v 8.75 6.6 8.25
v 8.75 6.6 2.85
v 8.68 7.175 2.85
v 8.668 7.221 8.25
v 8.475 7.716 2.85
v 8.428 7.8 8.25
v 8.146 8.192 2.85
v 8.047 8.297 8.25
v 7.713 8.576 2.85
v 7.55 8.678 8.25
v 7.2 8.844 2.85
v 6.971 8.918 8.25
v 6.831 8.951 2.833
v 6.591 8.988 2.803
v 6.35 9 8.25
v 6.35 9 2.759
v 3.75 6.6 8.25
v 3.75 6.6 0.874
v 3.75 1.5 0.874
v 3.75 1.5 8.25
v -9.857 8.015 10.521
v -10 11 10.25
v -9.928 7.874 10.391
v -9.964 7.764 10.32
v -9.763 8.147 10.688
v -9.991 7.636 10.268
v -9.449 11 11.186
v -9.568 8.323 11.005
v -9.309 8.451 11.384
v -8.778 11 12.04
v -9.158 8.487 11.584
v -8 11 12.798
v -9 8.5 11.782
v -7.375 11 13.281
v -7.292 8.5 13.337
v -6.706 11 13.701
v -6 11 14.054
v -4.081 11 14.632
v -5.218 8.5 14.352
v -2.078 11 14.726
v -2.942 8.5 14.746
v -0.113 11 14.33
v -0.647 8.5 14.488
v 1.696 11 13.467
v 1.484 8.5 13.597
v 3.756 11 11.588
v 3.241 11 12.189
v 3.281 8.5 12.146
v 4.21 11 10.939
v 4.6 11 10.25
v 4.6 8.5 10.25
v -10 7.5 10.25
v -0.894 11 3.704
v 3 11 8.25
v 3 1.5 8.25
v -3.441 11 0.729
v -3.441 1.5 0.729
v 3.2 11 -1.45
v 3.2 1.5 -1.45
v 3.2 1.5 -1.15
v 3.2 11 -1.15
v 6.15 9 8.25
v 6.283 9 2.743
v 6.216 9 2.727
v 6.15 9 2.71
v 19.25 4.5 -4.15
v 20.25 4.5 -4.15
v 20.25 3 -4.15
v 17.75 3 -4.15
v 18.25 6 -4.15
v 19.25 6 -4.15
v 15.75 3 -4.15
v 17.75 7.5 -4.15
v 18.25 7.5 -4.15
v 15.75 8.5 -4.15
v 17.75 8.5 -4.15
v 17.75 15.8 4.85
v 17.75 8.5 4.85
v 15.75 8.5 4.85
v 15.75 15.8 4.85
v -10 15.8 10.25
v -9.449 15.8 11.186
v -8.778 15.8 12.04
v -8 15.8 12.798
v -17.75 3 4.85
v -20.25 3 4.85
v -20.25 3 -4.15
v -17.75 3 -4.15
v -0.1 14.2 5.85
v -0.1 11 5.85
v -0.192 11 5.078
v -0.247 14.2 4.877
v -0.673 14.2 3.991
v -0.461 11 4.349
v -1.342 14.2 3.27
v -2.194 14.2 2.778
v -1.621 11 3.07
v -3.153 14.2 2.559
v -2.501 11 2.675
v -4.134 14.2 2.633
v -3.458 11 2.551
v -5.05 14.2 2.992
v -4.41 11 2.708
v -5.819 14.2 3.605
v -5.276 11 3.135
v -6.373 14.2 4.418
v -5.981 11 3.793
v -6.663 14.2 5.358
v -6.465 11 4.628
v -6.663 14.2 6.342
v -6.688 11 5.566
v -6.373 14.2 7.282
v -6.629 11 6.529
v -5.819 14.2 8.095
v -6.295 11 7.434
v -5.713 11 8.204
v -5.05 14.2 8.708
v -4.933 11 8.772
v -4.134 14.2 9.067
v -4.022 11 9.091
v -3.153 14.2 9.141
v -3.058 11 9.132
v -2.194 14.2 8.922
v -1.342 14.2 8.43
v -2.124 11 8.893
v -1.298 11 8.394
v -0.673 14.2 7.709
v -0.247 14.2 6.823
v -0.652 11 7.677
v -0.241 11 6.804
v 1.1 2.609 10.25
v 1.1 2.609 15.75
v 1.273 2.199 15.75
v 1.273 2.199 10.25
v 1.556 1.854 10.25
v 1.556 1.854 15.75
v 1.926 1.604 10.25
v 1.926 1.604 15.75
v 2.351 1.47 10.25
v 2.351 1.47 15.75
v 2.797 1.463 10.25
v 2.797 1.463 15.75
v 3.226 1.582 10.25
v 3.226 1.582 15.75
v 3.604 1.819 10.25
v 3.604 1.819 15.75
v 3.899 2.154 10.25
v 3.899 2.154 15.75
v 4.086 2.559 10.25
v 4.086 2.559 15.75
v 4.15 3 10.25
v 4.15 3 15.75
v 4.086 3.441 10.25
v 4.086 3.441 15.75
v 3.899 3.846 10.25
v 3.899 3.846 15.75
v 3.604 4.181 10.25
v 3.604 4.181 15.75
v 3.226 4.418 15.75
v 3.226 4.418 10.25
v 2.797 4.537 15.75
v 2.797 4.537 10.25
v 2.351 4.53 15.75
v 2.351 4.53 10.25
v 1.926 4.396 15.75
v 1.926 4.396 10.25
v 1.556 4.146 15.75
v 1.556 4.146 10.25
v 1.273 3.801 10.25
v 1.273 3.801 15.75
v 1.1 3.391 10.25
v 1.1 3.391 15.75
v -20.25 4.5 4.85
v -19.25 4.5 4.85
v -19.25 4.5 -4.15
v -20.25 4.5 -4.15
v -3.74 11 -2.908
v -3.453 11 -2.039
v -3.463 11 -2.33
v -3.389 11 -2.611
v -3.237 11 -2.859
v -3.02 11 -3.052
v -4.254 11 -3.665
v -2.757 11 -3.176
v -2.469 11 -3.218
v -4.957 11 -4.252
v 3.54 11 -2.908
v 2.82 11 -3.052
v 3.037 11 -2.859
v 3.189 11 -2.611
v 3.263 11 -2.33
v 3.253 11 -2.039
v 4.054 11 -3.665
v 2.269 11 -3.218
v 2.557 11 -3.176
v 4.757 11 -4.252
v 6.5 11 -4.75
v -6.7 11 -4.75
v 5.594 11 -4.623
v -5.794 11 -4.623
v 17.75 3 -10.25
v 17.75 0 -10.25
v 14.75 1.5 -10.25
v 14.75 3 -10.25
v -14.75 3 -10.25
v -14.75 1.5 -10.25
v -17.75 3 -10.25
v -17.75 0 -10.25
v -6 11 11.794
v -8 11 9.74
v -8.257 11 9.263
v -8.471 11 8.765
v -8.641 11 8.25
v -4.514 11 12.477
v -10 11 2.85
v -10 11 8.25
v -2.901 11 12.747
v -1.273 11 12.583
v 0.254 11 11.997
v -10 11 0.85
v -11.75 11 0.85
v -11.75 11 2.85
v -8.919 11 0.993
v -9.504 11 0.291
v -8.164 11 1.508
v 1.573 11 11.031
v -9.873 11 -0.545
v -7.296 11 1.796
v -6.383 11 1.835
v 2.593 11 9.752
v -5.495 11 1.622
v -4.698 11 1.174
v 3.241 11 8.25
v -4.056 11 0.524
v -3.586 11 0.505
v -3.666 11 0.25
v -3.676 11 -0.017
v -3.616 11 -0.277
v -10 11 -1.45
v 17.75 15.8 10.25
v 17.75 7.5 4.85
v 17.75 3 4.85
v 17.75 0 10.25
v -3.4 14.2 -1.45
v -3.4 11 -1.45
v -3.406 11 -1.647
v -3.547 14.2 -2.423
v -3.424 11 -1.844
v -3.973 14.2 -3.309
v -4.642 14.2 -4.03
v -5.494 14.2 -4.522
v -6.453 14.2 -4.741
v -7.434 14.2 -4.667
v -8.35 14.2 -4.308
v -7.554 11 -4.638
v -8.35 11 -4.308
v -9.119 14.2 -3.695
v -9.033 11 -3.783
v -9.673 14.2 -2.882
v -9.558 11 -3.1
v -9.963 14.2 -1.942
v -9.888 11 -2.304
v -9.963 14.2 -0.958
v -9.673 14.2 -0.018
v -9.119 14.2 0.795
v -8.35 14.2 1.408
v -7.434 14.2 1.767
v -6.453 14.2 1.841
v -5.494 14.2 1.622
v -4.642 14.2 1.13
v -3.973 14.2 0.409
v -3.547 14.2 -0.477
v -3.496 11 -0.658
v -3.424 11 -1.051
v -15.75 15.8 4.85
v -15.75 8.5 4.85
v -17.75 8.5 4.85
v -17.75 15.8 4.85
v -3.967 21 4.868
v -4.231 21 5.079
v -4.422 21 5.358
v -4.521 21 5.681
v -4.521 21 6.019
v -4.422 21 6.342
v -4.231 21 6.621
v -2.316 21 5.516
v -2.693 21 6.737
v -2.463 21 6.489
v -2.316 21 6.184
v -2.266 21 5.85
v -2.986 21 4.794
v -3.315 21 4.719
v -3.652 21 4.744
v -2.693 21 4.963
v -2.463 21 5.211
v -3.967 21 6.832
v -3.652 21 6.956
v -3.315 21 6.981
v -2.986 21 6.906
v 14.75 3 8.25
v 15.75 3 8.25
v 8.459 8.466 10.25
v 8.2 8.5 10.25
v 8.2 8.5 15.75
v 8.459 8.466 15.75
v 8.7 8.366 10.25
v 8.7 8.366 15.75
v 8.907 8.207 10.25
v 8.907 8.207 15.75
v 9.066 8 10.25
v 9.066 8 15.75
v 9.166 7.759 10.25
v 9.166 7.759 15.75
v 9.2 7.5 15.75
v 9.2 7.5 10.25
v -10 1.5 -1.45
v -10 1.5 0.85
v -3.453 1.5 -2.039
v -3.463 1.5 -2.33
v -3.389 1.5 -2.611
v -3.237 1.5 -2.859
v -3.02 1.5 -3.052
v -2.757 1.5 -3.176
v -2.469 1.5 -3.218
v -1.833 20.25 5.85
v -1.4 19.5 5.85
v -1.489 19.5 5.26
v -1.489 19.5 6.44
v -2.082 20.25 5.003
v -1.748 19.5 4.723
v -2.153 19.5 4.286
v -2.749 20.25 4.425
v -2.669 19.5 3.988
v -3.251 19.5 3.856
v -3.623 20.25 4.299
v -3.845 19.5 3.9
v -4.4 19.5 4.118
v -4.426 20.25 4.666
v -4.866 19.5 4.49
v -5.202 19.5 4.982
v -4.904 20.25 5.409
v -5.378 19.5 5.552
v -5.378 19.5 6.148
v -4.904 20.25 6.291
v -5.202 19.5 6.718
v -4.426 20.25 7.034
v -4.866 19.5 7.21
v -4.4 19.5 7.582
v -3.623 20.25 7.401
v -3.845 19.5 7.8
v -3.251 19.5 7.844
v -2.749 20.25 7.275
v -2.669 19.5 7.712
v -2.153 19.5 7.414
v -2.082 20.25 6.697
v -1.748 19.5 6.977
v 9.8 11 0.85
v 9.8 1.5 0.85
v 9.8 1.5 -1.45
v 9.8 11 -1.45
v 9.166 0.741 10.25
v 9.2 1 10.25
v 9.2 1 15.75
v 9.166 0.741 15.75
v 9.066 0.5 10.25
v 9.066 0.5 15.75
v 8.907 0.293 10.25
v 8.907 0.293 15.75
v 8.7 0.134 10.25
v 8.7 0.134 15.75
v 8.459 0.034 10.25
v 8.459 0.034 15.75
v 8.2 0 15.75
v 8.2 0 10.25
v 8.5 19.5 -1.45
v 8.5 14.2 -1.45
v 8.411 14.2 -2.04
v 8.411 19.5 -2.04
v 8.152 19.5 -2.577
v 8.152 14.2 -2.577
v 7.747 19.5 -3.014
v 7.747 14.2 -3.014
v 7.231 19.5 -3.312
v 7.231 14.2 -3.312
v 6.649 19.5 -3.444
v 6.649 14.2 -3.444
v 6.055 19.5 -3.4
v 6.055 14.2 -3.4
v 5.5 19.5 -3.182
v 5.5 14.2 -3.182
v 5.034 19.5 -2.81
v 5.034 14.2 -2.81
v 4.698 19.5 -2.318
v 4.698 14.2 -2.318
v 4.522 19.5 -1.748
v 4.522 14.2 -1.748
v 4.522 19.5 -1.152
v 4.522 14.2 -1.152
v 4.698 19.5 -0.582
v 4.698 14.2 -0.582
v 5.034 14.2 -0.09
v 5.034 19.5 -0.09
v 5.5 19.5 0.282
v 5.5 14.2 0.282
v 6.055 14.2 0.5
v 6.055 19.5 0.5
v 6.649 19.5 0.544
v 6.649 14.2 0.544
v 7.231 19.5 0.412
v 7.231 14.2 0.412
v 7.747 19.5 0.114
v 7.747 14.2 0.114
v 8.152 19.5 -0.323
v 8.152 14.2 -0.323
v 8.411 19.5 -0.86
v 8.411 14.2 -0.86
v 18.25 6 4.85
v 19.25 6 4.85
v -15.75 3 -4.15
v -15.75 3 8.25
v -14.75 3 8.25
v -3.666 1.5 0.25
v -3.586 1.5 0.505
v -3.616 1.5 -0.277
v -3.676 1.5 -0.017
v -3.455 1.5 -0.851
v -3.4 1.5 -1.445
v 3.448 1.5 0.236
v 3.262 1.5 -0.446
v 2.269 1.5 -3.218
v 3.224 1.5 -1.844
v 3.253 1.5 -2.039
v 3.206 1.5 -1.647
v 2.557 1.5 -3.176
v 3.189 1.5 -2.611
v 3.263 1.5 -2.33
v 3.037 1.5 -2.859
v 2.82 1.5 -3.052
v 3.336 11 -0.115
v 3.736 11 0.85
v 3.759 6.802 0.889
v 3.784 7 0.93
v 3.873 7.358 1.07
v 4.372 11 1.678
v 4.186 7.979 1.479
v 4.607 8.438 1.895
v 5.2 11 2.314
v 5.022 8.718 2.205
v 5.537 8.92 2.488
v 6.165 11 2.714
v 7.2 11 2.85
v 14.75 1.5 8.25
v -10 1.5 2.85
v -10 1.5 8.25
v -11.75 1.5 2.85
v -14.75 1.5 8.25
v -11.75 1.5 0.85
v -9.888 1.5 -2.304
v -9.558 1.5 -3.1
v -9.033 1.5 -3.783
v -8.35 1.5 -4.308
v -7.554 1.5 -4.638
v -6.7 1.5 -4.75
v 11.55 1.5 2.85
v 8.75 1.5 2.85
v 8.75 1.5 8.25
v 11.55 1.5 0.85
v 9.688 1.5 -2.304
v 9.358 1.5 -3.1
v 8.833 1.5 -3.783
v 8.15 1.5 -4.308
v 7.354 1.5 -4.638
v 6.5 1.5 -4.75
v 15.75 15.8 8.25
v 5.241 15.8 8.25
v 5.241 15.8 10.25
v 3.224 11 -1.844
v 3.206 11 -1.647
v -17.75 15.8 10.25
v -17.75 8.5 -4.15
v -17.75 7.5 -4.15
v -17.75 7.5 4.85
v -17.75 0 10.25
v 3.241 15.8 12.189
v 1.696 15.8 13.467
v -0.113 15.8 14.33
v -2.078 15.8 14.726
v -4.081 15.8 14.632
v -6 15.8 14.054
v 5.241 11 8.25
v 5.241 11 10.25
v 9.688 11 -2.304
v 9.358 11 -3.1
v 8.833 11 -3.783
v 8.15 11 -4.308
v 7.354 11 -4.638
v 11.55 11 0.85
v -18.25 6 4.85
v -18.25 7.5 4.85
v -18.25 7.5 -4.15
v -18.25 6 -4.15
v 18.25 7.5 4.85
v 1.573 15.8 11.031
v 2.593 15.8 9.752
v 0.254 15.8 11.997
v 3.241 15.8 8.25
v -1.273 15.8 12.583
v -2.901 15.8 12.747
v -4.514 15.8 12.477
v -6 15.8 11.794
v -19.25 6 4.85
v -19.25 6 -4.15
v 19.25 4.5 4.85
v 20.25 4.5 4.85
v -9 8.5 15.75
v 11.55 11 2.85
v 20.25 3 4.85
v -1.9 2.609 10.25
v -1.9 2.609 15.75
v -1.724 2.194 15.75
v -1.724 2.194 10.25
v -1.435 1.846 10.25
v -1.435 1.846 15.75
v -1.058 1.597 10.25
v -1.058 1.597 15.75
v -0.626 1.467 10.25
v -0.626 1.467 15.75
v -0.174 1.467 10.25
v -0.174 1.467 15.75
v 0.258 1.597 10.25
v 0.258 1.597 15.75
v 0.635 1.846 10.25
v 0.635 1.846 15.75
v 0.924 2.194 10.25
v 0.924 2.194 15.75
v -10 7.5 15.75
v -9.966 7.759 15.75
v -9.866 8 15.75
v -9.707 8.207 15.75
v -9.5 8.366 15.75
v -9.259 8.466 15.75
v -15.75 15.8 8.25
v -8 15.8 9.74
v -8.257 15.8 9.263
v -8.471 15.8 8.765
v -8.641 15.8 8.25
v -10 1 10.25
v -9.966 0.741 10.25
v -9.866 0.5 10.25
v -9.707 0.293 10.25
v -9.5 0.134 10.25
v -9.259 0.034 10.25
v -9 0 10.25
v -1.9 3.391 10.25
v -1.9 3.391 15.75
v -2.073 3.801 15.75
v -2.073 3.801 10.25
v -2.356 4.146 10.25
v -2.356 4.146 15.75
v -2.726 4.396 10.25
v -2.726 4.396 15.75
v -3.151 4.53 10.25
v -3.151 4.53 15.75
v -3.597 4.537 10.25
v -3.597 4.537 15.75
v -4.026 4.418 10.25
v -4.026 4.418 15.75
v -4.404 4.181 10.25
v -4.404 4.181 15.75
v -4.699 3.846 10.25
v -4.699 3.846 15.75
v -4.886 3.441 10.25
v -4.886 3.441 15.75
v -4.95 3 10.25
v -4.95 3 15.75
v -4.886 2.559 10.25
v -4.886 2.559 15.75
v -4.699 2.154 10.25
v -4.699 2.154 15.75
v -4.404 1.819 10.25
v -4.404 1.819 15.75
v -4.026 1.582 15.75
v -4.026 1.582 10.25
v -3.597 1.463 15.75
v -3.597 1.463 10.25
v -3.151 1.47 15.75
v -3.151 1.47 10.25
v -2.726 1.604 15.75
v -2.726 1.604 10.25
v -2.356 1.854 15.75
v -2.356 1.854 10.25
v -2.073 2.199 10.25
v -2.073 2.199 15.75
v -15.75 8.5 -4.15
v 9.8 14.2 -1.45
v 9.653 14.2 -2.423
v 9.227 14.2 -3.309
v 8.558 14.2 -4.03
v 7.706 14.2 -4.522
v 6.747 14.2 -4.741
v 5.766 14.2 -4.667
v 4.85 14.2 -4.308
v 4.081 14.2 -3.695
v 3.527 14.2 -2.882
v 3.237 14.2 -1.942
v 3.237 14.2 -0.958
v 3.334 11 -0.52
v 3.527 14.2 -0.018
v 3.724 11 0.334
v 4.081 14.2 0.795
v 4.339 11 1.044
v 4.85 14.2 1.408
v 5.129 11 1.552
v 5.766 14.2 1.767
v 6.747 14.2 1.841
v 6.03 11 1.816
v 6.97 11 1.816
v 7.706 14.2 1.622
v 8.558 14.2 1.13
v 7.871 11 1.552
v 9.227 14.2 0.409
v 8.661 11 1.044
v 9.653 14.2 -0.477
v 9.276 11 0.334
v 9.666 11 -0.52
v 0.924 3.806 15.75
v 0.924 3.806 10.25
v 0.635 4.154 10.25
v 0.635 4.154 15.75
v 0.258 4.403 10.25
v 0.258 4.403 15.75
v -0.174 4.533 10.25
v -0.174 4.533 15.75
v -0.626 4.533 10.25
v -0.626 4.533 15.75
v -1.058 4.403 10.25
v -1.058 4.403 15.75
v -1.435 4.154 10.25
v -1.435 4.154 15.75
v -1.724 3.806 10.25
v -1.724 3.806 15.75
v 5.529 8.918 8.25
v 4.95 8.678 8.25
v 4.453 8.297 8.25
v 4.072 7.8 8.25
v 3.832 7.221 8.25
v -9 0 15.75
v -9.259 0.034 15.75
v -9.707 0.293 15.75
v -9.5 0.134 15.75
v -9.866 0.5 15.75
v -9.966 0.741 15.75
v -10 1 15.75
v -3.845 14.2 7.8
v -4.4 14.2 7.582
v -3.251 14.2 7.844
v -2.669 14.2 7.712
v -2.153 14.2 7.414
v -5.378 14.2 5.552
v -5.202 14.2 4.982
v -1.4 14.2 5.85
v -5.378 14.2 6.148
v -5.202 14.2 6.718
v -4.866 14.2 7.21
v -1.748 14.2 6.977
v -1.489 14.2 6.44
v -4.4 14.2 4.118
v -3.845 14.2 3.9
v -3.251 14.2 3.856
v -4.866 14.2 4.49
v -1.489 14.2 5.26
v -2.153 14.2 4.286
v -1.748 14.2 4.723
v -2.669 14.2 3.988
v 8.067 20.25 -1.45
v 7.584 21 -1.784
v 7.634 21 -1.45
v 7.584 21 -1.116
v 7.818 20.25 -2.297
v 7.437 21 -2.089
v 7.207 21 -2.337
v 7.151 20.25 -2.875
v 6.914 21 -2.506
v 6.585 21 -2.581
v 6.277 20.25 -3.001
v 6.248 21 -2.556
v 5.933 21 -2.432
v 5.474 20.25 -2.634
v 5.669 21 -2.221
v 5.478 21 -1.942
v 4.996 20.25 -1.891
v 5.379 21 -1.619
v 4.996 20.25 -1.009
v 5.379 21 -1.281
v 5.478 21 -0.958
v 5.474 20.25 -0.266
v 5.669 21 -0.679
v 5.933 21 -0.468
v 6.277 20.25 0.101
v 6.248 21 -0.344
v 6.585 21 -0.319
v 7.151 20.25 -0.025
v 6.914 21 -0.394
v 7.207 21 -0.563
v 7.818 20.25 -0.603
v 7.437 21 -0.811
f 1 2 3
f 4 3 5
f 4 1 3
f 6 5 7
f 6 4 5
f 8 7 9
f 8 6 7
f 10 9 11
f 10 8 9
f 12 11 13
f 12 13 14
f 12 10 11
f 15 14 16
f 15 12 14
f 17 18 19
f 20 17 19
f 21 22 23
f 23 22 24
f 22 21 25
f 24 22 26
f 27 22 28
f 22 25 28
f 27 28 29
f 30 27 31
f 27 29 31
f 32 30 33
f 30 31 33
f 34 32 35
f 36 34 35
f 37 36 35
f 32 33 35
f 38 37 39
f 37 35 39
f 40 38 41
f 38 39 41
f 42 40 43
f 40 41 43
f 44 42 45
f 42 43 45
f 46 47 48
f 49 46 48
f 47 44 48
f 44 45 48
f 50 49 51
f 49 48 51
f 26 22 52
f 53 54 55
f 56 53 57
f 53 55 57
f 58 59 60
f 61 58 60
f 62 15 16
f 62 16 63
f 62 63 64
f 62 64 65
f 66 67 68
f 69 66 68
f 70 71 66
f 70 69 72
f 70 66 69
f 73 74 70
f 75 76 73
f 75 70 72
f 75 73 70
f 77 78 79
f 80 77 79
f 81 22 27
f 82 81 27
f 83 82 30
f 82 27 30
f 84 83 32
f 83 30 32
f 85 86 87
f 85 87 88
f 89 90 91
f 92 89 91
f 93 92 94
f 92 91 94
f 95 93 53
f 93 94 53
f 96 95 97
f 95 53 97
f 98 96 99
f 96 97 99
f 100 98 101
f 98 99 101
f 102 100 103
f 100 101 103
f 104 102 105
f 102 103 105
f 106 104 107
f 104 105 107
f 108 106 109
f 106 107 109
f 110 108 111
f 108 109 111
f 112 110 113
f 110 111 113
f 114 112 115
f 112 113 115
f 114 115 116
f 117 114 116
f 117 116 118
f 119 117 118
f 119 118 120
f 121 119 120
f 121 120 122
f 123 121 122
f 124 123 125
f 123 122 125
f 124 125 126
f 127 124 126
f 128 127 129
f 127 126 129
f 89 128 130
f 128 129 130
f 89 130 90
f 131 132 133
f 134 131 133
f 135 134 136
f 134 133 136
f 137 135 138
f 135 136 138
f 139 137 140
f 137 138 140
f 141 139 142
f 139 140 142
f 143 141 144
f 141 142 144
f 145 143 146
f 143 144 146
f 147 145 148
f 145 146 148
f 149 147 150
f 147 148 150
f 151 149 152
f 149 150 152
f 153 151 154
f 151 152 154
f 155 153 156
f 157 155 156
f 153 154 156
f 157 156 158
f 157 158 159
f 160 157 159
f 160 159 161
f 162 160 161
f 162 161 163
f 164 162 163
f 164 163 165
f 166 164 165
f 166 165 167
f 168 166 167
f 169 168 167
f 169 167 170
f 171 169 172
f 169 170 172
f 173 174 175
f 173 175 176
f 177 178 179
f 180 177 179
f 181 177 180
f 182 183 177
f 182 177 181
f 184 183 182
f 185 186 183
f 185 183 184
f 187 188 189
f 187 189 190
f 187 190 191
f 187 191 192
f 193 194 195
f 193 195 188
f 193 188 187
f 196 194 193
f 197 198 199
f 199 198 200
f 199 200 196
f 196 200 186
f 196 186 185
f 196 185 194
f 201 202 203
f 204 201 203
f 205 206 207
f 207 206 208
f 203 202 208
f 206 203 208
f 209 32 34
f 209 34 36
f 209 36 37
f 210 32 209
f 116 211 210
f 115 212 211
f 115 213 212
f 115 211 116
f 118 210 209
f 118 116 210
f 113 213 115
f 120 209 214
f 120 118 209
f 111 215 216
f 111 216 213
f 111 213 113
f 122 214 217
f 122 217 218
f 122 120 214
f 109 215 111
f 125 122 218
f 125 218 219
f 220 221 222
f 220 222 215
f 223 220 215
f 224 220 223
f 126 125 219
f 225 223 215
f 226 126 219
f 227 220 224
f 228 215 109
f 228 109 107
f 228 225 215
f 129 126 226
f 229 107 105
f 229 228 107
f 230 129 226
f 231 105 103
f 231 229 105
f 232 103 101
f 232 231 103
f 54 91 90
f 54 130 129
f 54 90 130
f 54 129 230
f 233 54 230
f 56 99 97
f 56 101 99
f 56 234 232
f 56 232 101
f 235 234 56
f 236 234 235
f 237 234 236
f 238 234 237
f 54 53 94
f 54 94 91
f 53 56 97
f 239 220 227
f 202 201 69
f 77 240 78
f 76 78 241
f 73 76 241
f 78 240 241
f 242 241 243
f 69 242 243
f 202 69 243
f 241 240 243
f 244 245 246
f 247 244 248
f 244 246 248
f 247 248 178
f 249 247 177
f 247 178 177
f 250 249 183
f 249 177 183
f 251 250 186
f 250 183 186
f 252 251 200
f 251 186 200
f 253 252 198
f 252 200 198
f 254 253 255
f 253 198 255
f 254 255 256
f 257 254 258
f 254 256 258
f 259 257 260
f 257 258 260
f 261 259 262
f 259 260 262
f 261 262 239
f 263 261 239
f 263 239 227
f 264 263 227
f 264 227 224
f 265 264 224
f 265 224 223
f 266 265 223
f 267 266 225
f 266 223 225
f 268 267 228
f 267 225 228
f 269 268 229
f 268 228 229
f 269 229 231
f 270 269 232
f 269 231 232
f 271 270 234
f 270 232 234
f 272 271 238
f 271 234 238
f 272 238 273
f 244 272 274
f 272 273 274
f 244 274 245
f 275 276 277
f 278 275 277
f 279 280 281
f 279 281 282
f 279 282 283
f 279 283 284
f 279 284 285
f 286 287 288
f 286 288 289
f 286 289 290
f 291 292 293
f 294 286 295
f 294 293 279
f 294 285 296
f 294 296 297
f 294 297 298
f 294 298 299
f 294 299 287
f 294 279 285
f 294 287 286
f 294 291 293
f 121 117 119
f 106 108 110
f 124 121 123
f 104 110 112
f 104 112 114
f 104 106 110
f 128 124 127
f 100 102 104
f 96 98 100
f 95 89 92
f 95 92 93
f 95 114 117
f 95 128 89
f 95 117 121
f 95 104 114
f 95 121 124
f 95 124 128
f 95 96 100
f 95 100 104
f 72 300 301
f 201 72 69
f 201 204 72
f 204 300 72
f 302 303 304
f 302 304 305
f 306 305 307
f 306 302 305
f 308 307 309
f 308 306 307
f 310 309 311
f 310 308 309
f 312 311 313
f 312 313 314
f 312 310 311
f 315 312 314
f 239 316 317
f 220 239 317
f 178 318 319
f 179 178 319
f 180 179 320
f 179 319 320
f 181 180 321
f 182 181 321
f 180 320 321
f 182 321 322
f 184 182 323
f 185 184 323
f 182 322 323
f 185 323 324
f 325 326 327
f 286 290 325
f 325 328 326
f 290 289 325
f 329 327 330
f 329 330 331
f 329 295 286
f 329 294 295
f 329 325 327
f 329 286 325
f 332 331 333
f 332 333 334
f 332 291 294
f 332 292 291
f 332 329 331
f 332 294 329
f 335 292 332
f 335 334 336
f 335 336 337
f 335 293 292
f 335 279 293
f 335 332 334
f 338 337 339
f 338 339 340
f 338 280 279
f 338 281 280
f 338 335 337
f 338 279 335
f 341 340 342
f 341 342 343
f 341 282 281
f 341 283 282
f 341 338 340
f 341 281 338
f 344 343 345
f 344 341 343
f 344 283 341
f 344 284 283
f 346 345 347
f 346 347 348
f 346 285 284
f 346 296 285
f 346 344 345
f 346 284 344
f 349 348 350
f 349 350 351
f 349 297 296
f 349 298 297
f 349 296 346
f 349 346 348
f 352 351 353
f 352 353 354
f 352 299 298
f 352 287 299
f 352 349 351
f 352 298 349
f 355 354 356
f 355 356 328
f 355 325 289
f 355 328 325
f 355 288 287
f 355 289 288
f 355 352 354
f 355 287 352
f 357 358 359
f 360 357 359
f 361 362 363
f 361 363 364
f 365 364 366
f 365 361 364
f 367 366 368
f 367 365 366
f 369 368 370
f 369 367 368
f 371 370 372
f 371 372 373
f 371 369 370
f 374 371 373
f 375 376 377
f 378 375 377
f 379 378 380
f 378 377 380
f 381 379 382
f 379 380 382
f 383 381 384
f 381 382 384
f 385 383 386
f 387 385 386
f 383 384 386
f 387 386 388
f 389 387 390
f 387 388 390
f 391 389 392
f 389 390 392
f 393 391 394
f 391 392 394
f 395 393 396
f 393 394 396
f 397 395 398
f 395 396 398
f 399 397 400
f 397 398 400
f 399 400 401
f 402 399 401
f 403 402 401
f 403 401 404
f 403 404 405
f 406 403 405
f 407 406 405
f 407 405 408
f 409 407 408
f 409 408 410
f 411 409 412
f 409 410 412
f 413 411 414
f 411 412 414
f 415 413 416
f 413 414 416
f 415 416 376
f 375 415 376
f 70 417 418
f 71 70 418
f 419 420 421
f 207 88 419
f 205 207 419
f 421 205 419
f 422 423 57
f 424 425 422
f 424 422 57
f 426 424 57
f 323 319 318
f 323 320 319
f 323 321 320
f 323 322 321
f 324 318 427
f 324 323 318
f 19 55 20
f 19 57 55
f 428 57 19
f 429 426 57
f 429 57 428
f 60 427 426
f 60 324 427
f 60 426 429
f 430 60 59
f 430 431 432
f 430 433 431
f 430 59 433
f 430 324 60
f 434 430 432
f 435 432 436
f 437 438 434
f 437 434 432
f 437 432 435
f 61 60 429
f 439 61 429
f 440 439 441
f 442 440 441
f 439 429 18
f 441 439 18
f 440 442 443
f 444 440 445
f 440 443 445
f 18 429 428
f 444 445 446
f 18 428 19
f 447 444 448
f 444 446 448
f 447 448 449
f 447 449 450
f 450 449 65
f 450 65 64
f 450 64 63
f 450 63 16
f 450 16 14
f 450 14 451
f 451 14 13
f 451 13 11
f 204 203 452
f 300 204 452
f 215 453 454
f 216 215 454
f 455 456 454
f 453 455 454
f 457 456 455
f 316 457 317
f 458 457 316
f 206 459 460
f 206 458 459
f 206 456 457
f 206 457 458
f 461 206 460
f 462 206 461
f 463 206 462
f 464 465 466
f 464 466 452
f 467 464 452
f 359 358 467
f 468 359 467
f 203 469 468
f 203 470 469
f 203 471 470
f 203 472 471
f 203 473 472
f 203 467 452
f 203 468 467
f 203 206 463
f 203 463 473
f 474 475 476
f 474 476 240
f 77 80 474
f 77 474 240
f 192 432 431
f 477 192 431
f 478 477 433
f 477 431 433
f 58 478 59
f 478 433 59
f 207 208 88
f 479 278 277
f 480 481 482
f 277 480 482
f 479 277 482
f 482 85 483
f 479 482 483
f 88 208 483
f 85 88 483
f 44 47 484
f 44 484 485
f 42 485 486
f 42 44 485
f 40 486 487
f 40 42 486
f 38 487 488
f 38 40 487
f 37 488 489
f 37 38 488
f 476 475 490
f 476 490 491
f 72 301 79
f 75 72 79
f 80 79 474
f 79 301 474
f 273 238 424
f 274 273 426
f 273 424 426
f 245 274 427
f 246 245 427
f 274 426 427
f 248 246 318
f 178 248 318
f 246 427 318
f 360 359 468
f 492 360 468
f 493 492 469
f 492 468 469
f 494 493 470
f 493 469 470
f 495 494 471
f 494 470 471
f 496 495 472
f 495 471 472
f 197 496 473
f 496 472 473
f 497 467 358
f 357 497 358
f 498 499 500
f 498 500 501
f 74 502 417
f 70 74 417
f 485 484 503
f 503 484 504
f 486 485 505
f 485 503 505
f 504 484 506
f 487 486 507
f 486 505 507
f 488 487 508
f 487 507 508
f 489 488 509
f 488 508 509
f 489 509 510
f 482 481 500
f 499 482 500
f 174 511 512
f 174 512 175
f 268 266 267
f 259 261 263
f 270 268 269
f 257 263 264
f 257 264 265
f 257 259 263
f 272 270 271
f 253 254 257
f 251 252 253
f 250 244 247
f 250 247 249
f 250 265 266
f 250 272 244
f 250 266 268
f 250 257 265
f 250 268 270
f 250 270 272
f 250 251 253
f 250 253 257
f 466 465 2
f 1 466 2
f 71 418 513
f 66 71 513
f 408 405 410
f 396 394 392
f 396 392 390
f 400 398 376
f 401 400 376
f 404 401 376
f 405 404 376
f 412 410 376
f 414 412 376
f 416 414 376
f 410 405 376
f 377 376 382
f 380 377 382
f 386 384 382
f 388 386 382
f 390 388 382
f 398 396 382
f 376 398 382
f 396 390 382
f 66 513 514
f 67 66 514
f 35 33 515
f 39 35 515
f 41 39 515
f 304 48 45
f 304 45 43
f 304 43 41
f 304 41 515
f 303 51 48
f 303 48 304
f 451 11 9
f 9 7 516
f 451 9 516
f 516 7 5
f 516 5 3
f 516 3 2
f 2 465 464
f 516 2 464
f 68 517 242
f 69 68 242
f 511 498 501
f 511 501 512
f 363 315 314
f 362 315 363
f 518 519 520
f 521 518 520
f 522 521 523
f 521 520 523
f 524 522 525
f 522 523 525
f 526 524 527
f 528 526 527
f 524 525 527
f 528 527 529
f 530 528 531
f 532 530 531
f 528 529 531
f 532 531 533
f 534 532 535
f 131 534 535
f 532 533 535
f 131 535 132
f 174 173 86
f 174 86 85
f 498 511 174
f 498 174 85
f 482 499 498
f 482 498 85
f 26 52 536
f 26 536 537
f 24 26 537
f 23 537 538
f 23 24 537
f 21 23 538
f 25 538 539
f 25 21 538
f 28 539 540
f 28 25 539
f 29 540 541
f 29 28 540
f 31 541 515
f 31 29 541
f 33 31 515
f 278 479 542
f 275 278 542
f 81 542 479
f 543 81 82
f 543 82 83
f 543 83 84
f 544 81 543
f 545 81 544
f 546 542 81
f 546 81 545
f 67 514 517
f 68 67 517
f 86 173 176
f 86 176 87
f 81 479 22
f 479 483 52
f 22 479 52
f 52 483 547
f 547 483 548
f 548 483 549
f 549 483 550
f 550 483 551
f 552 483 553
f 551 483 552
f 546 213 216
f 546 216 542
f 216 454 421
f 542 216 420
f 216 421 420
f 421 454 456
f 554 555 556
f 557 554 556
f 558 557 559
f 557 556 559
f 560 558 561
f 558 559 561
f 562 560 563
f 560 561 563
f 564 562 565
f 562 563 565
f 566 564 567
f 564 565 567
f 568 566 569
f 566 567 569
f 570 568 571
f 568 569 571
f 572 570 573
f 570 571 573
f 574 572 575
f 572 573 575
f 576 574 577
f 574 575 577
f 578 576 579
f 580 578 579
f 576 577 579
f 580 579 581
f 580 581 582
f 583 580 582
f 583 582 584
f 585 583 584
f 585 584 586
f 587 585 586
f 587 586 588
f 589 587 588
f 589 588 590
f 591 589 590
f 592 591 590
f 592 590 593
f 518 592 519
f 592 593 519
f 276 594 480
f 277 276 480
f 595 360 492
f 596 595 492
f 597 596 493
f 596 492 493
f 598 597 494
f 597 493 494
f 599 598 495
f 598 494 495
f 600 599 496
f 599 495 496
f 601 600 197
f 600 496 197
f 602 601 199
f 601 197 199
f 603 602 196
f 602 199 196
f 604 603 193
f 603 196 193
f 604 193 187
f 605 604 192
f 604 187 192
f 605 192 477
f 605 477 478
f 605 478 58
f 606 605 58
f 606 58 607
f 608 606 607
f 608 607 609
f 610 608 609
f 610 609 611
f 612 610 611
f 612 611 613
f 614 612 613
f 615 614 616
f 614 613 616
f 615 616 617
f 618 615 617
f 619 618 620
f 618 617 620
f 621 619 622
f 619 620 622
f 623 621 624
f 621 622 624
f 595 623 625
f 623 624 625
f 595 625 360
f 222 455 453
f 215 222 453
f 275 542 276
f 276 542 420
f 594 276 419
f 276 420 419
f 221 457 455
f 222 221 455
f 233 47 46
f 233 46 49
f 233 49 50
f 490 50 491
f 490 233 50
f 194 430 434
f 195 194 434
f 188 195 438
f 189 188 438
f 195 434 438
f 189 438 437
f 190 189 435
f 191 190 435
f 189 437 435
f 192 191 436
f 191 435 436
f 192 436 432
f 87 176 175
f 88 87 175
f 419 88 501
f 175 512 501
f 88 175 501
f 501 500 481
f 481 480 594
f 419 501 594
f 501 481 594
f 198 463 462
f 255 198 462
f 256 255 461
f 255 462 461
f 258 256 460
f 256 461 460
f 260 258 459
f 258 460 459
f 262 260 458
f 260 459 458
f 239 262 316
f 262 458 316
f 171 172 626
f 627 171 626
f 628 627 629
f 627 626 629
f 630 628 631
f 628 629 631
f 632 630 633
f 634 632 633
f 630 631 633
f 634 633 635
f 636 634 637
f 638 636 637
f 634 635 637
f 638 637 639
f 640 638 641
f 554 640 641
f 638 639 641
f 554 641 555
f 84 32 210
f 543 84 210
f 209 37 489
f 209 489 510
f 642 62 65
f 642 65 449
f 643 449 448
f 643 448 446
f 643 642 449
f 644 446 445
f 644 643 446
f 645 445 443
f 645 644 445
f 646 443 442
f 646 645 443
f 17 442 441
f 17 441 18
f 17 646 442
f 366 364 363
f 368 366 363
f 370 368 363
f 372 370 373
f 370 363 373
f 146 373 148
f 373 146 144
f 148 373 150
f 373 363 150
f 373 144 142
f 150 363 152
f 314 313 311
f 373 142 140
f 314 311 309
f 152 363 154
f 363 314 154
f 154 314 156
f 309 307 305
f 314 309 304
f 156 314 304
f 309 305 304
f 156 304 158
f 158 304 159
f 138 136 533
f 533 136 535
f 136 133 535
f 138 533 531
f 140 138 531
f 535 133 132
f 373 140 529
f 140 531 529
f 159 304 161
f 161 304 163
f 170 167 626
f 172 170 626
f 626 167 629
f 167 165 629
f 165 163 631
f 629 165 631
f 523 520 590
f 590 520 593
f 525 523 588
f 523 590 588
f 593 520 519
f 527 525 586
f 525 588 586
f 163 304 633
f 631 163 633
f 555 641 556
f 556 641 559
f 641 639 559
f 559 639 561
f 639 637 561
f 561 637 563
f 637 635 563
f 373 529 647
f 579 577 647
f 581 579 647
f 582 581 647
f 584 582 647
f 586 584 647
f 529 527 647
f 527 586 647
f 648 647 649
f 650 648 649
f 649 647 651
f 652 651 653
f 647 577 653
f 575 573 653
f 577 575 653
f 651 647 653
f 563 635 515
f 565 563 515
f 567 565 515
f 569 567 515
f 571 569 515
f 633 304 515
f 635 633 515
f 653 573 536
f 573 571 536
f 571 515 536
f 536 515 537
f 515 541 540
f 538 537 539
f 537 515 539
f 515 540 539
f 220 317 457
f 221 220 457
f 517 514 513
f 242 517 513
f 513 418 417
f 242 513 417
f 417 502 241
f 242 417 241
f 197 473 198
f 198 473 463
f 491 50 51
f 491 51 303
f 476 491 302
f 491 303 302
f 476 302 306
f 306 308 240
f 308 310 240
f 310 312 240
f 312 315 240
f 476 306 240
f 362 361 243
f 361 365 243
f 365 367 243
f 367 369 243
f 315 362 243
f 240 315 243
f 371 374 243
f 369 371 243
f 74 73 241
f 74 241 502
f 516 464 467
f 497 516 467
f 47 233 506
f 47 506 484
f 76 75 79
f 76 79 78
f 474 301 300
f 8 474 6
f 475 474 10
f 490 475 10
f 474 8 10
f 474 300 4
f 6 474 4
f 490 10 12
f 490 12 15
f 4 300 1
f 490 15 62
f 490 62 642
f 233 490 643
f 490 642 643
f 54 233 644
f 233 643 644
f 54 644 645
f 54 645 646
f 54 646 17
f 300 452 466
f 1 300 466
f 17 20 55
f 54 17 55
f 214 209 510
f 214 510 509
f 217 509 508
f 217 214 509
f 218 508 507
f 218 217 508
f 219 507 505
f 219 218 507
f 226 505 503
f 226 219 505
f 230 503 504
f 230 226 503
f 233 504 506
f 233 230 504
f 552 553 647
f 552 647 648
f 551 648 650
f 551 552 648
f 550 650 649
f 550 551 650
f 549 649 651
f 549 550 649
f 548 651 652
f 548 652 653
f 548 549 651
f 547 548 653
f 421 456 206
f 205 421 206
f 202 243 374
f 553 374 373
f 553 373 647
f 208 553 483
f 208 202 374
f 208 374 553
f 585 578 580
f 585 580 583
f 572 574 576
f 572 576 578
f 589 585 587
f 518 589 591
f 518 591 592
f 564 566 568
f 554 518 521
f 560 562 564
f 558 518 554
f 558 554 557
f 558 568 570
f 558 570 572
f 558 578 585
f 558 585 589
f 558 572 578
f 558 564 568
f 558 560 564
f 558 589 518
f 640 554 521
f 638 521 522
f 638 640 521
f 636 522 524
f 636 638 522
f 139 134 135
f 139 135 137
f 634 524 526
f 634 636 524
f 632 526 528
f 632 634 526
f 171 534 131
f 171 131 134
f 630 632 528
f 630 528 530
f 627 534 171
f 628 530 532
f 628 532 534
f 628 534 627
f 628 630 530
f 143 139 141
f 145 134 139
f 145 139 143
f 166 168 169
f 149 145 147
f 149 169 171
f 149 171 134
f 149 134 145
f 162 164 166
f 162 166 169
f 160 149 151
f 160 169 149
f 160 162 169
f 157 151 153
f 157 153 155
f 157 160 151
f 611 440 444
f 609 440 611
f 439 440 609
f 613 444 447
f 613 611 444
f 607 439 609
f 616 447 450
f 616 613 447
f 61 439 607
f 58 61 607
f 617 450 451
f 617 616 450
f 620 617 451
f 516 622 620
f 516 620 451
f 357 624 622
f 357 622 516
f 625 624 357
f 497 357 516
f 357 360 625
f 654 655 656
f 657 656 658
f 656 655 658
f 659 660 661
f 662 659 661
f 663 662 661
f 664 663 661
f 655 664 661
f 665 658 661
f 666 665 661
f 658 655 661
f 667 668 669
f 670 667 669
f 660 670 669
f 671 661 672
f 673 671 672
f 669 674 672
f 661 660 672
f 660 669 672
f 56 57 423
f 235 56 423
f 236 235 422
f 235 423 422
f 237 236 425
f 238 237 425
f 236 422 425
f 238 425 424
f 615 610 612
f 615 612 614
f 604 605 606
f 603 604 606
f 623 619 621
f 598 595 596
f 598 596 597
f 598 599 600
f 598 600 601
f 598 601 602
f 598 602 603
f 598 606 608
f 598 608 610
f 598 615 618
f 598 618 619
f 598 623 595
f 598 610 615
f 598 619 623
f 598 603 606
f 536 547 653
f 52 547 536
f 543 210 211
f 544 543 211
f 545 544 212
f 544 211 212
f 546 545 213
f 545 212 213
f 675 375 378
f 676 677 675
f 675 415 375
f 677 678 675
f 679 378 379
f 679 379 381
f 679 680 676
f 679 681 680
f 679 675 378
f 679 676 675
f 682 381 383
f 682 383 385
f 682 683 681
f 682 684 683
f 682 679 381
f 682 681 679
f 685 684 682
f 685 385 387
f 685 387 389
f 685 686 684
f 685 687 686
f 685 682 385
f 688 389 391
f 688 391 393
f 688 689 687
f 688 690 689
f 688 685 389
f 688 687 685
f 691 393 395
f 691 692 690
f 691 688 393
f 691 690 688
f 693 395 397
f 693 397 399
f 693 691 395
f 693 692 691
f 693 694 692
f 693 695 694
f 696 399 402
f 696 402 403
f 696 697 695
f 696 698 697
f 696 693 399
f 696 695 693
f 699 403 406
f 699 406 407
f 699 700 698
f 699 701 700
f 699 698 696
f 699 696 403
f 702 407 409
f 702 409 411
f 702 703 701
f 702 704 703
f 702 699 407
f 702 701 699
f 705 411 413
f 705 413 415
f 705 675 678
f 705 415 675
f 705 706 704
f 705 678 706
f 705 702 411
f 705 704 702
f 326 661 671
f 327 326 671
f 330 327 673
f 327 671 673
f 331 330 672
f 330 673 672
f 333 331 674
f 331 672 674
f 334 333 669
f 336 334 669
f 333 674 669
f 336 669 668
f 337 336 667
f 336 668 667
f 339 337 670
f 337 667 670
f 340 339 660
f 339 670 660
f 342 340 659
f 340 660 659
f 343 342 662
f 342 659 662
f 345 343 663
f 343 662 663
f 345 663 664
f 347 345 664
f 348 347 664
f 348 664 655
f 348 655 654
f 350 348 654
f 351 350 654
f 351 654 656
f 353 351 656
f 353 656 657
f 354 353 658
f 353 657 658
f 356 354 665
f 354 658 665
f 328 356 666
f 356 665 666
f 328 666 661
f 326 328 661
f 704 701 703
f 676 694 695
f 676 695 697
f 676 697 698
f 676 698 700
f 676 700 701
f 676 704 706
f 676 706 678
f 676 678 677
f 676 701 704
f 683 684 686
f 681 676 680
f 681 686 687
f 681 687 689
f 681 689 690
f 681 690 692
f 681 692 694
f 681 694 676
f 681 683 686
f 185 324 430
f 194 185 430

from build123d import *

# Parameters (mm, degrees)
SKETCH1_W             = 35.5
SKETCH1_H             = 20.5
BOSS_EXTRUDE1_DEPTH   = 1.5
BOSS_EXTRUDE2_DEPTH   = 1.5
BOSS_EXTRUDE4_DEPTH   = 9.5
SKETCH6_R             = 3.3
BOSS_EXTRUDE5_DEPTH   = 3.2
SKETCH7_R             = 2
BOSS_EXTRUDE6_DEPTH   = 6.8
BOSS_EXTRUDE6_2_DEPTH = 6.8
CHAMFER1_SIZE         = 1.5
CHAMFER1_SIZE2        = 0.866025404
CHAMFER2_SIZE         = 1.5
CHAMFER2_SIZE2        = 0.866025404
BOSS_EXTRUDE7_DEPTH   = 8
BOSS_EXTRUDE8_DEPTH   = 4.8
BOSS_EXTRUDE9_DEPTH   = 5.5
BOSS_EXTRUDE10_DEPTH  = 9
BOSS_EXTRUDE11_DEPTH  = 9
CUT_EXTRUDE4_DEPTH    = 5.5


with BuildPart() as part:
    # Sketch1 → Boss-Extrude1 (new body)
    with BuildSketch(Plane(origin=(0, 0, 0), x_dir=(1, 0, 0), z_dir=(0, 1, 0))):
        Rectangle(SKETCH1_W, SKETCH1_H)
    extrude(amount=BOSS_EXTRUDE1_DEPTH)

    # Sketch2 → Boss-Extrude2 (add)
    with BuildSketch(Plane(origin=(0, 1.5, 0), x_dir=(1, 0, 0), z_dir=(0, 1, 0))):
        Polygon((17.75, 10.25), (14.75, 10.25), (14.75, -8.25), (-14.75, -8.25), (-14.75, 10.25), (-17.75, 10.25), (-17.75, -10.25), (17.75, -10.25), align=None)
    extrude(amount=BOSS_EXTRUDE2_DEPTH)

    # Sketch4 → Boss-Extrude4 (add)
    with BuildSketch(Plane(origin=(0, 1.5, 0), x_dir=(1, 0, 0), z_dir=(0, 1, 0))):
        with BuildLine():
            ThreePointArc((9.8, 1.45), (8.833452378, 3.783452378), (6.5, 4.75))
            Line((6.5, 4.75), (-6.7, 4.75))
            ThreePointArc((-6.7, 4.75), (-9.033452378, 3.783452378), (-10, 1.45))
            Line((-10, 1.45), (-10, -0.85))
            Line((-10, -0.85), (-11.75, -0.85))
            Line((-11.75, -0.85), (-11.75, -2.85))
            Line((-11.75, -2.85), (-10, -2.85))
            Line((-10, -2.85), (-10, -8.25))
            Line((-10, -8.25), (3, -8.25))
            Line((3, -8.25), (-3.440516213, -0.729311618))
            ThreePointArc((-3.440516213, -0.729311618), (-3.666156861, -0.250346383), (-3.615628786, 0.276690914))
            ThreePointArc((-3.615628786, 0.276690914), (-3.413949819, 1.146892415), (-3.453044202, 2.03930302))
            ThreePointArc((-3.453044202, 2.03930302), (-3.236769385, 2.858747591), (-2.469118203, 3.217879692))
            Line((-2.469118203, 3.217879692), (2.269118203, 3.217879692))
            ThreePointArc((2.269118203, 3.217879692), (3.036769385, 2.858747591), (3.253044202, 2.03930302))
            ThreePointArc((3.253044202, 2.03930302), (3.213287803, 1.745842752), (3.2, 1.45))
            Line((3.2, 1.45), (3.2, 1.15))
            ThreePointArc((3.2, 1.15), (4.371572875, -1.678427125), (7.2, -2.85))
            Line((7.2, -2.85), (9.8, -2.85))
            Line((9.8, -2.85), (11.55, -2.85))
            Line((11.55, -2.85), (11.55, -0.85))
            Line((11.55, -0.85), (9.8, -0.85))
            Line((9.8, -0.85), (9.8, 1.45))
        make_face()
        with BuildLine():
            Line((3, -8.25), (-10, -8.25))
            Line((-10, -8.25), (-10, -10.25))
            ThreePointArc((-10, -10.25), (-2.7, -14.75), (4.6, -10.25))
            Line((4.6, -10.25), (4.6, -8.25))
            Line((4.6, -8.25), (3, -8.25))
        make_face()
    extrude(amount=BOSS_EXTRUDE4_DEPTH)

    # Sketch6 → Boss-Extrude5 (add)
    with BuildSketch(Plane(origin=(0, 11, 0), x_dir=(1, 0, 0), z_dir=(0, 1, 0))):
        with Locations((-6.7, 1.45)):
            Circle(SKETCH6_R)
        with Locations((6.5, 1.45)):
            Circle(SKETCH6_R)
        with Locations((-3.4, -5.85)):
            Circle(SKETCH6_R)
    extrude(amount=BOSS_EXTRUDE5_DEPTH)

    # Sketch8 → Boss-Extrude7 (add)
    with BuildSketch(Plane(origin=(0, 3, 0), x_dir=(1, 0, 0), z_dir=(0, 1, 0))):
        with BuildLine():
            Line((-17.75, -10.25), (-10, -10.25))
            ThreePointArc((-10, -10.25), (-2.7, -14.75), (4.6, -10.25))
            Line((4.6, -10.25), (17.75, -10.25))
            Line((17.75, -10.25), (17.75, -4.85))
            Line((17.75, -4.85), (15.75, -4.85))
            Line((15.75, -4.85), (15.75, -8.25))
            Line((15.75, -8.25), (14.75, -8.25))
            Line((14.75, -8.25), (4.6, -8.25))
            Line((4.6, -8.25), (3.240538696, -8.25))
            ThreePointArc((3.240538696, -8.25), (-2.7, -12.75), (-8.640538696, -8.25))
            Line((-8.640538696, -8.25), (-10, -8.25))
            Line((-10, -8.25), (-14.75, -8.25))
            Line((-14.75, -8.25), (-15.75, -8.25))
            Line((-15.75, -8.25), (-15.75, -4.85))
            Line((-15.75, -4.85), (-17.75, -4.85))
            Line((-17.75, -4.85), (-17.75, -10.25))
        make_face()
    extrude(amount=BOSS_EXTRUDE7_DEPTH)

    # Sketch9 → Boss-Extrude8 (add)
    with BuildSketch(Plane(origin=(0, 11, 0), x_dir=(1, 0, 0), z_dir=(0, 1, 0))):
        Polygon((17.75, -10.25), (17.75, -4.85), (15.75, -4.85), (15.75, -8.25), (5.240538696, -8.25), (5.240538696, -10.25), align=None)
        with BuildLine():
            Line((-17.75, -4.85), (-17.75, -10.25))
            Line((-17.75, -10.25), (-10, -10.25))
            ThreePointArc((-10, -10.25), (-9.127522593, -11.624085625), (-8, -12.797976988))
            Line((-8, -12.797976988), (-8, -9.739998243))
            ThreePointArc((-8, -9.739998243), (-8.369431297, -9.016133462), (-8.640538696, -8.25))
            Line((-8.640538696, -8.25), (-15.75, -8.25))
            Line((-15.75, -8.25), (-15.75, -4.85))
            Line((-15.75, -4.85), (-17.75, -4.85))
        make_face()
        with BuildLine():
            Line((3.240538696, -8.25), (3.240538696, -12.189330653))
            ThreePointArc((3.240538696, -12.189330653), (-1.083725026, -14.588552552), (-6, -14.05398466))
            Line((-6, -14.05398466), (-6, -11.793542506))
            ThreePointArc((-6, -11.793542506), (-0.490410779, -12.340861452), (3.240538696, -8.25))
        make_face()
    extrude(amount=BOSS_EXTRUDE8_DEPTH)

    # Sketch10 → Boss-Extrude9 (add)
    with BuildSketch(Plane.XY.offset(10.25)):
        with BuildLine():
            Line((-10, 1), (-10, 7.5))
            ThreePointArc((-10, 7.5), (-9.707106781, 8.207106781), (-9, 8.5))
            Line((-9, 8.5), (8.2, 8.5))
            ThreePointArc((8.2, 8.5), (8.907106781, 8.207106781), (9.2, 7.5))
            Line((9.2, 7.5), (9.2, 1))
            ThreePointArc((9.2, 1), (8.907106781, 0.292893219), (8.2, 0))
            Line((8.2, 0), (-9, 0))
            ThreePointArc((-9, 0), (-9.707106781, 0.292893219), (-10, 1))
        make_face()
    extrude(amount=BOSS_EXTRUDE9_DEPTH)

    # Sketch11 → Boss-Extrude10 (add)
    with BuildSketch(Plane(origin=(0, 0, 4.85), x_dir=(-1, 0, 0), z_dir=(0, 0, -1))):
        Polygon((-15.75, 8.5), (-17.75, 8.5), (-17.75, 7.5), (-18.25, 7.5), (-18.25, 6), (-19.25, 6), (-19.25, 4.5), (-20.25, 4.5), (-20.25, 3), (-15.75, 3), align=None)
        Polygon((20.25, 4.5), (20.25, 3), (15.75, 3), (15.75, 8.5), (17.75, 8.5), (17.75, 7.5), (18.25, 7.5), (18.25, 6), (19.25, 6), (19.25, 4.5), align=None)
    extrude(amount=BOSS_EXTRUDE10_DEPTH)

    # Sketch12 → Boss-Extrude11 (add)
    with BuildSketch(Plane(origin=(0, 0, 8.25), x_dir=(-1, 0, 0), z_dir=(0, 0, -1))):
        with BuildLine():
            Line((-8.75, 1.5), (-8.75, 6.6))
            ThreePointArc((-8.75, 6.6), (-8.047056275, 8.297056275), (-6.35, 9))
            Line((-6.35, 9), (-6.15, 9))
            ThreePointArc((-6.15, 9), (-4.452943725, 8.297056275), (-3.75, 6.6))
            Line((-3.75, 6.6), (-3.75, 1.5))
            Line((-3.75, 1.5), (-8.75, 1.5))
        make_face()
    extrude(amount=BOSS_EXTRUDE11_DEPTH)

    # Sketch13 → Cut-Extrude4 (cut)
    with BuildSketch(Plane.XY.offset(15.75)):
        with BuildLine():
            ThreePointArc((-1.9, 2.609487516), (-0.4, 1.45), (1.1, 2.609487516))
            ThreePointArc((1.1, 2.609487516), (4.15, 3), (1.1, 3.390512484))
            ThreePointArc((1.1, 3.390512484), (-0.4, 4.55), (-1.9, 3.390512484))
            ThreePointArc((-1.9, 3.390512484), (-4.95, 3), (-1.9, 2.609487516))
        make_face()
    extrude(amount=-CUT_EXTRUDE4_DEPTH, mode=Mode.SUBTRACT)


with BuildPart() as body_2:
    # Sketch7 → Boss-Extrude6 (new body)
    with BuildSketch(Plane(origin=(0, 14.2, 0), x_dir=(1, 0, 0), z_dir=(0, 1, 0))):
        with Locations((-3.4, -5.85)):
            Circle(SKETCH7_R)
    extrude(amount=BOSS_EXTRUDE6_DEPTH)

    # Chamfer1
    chamfer1_edges = [body_2.edges().sort_by_distance(p)[0] for p in [
        (-5.4, 21, 5.85),
    ]]
    chamfer1_side = [body_2.faces().sort_by_distance(p)[0] for p in [
        (-5.4, 17.6, 5.85),
    ]]
    chamfer(chamfer1_edges, length=CHAMFER1_SIZE, length2=CHAMFER1_SIZE2, reference=chamfer1_side[0])


with BuildPart() as body_3:
    # Sketch7 → Boss-Extrude6 2 (new body)
    with BuildSketch(Plane(origin=(0, 14.2, 0), x_dir=(1, 0, 0), z_dir=(0, 1, 0))):
        with Locations((6.5, 1.45)):
            Circle(SKETCH7_R)
    extrude(amount=BOSS_EXTRUDE6_2_DEPTH)

    # Chamfer2
    chamfer2_edges = [body_3.edges().sort_by_distance(p)[0] for p in [
        (4.5, 21, -1.45),
    ]]
    chamfer2_side = [body_3.faces().sort_by_distance(p)[0] for p in [
        (4.5, 17.6, -1.45),
    ]]
    chamfer(chamfer2_edges, length=CHAMFER2_SIZE, length2=CHAMFER2_SIZE2, reference=chamfer2_side[0])


solid = Compound([part.part, body_2.part, body_3.part])
